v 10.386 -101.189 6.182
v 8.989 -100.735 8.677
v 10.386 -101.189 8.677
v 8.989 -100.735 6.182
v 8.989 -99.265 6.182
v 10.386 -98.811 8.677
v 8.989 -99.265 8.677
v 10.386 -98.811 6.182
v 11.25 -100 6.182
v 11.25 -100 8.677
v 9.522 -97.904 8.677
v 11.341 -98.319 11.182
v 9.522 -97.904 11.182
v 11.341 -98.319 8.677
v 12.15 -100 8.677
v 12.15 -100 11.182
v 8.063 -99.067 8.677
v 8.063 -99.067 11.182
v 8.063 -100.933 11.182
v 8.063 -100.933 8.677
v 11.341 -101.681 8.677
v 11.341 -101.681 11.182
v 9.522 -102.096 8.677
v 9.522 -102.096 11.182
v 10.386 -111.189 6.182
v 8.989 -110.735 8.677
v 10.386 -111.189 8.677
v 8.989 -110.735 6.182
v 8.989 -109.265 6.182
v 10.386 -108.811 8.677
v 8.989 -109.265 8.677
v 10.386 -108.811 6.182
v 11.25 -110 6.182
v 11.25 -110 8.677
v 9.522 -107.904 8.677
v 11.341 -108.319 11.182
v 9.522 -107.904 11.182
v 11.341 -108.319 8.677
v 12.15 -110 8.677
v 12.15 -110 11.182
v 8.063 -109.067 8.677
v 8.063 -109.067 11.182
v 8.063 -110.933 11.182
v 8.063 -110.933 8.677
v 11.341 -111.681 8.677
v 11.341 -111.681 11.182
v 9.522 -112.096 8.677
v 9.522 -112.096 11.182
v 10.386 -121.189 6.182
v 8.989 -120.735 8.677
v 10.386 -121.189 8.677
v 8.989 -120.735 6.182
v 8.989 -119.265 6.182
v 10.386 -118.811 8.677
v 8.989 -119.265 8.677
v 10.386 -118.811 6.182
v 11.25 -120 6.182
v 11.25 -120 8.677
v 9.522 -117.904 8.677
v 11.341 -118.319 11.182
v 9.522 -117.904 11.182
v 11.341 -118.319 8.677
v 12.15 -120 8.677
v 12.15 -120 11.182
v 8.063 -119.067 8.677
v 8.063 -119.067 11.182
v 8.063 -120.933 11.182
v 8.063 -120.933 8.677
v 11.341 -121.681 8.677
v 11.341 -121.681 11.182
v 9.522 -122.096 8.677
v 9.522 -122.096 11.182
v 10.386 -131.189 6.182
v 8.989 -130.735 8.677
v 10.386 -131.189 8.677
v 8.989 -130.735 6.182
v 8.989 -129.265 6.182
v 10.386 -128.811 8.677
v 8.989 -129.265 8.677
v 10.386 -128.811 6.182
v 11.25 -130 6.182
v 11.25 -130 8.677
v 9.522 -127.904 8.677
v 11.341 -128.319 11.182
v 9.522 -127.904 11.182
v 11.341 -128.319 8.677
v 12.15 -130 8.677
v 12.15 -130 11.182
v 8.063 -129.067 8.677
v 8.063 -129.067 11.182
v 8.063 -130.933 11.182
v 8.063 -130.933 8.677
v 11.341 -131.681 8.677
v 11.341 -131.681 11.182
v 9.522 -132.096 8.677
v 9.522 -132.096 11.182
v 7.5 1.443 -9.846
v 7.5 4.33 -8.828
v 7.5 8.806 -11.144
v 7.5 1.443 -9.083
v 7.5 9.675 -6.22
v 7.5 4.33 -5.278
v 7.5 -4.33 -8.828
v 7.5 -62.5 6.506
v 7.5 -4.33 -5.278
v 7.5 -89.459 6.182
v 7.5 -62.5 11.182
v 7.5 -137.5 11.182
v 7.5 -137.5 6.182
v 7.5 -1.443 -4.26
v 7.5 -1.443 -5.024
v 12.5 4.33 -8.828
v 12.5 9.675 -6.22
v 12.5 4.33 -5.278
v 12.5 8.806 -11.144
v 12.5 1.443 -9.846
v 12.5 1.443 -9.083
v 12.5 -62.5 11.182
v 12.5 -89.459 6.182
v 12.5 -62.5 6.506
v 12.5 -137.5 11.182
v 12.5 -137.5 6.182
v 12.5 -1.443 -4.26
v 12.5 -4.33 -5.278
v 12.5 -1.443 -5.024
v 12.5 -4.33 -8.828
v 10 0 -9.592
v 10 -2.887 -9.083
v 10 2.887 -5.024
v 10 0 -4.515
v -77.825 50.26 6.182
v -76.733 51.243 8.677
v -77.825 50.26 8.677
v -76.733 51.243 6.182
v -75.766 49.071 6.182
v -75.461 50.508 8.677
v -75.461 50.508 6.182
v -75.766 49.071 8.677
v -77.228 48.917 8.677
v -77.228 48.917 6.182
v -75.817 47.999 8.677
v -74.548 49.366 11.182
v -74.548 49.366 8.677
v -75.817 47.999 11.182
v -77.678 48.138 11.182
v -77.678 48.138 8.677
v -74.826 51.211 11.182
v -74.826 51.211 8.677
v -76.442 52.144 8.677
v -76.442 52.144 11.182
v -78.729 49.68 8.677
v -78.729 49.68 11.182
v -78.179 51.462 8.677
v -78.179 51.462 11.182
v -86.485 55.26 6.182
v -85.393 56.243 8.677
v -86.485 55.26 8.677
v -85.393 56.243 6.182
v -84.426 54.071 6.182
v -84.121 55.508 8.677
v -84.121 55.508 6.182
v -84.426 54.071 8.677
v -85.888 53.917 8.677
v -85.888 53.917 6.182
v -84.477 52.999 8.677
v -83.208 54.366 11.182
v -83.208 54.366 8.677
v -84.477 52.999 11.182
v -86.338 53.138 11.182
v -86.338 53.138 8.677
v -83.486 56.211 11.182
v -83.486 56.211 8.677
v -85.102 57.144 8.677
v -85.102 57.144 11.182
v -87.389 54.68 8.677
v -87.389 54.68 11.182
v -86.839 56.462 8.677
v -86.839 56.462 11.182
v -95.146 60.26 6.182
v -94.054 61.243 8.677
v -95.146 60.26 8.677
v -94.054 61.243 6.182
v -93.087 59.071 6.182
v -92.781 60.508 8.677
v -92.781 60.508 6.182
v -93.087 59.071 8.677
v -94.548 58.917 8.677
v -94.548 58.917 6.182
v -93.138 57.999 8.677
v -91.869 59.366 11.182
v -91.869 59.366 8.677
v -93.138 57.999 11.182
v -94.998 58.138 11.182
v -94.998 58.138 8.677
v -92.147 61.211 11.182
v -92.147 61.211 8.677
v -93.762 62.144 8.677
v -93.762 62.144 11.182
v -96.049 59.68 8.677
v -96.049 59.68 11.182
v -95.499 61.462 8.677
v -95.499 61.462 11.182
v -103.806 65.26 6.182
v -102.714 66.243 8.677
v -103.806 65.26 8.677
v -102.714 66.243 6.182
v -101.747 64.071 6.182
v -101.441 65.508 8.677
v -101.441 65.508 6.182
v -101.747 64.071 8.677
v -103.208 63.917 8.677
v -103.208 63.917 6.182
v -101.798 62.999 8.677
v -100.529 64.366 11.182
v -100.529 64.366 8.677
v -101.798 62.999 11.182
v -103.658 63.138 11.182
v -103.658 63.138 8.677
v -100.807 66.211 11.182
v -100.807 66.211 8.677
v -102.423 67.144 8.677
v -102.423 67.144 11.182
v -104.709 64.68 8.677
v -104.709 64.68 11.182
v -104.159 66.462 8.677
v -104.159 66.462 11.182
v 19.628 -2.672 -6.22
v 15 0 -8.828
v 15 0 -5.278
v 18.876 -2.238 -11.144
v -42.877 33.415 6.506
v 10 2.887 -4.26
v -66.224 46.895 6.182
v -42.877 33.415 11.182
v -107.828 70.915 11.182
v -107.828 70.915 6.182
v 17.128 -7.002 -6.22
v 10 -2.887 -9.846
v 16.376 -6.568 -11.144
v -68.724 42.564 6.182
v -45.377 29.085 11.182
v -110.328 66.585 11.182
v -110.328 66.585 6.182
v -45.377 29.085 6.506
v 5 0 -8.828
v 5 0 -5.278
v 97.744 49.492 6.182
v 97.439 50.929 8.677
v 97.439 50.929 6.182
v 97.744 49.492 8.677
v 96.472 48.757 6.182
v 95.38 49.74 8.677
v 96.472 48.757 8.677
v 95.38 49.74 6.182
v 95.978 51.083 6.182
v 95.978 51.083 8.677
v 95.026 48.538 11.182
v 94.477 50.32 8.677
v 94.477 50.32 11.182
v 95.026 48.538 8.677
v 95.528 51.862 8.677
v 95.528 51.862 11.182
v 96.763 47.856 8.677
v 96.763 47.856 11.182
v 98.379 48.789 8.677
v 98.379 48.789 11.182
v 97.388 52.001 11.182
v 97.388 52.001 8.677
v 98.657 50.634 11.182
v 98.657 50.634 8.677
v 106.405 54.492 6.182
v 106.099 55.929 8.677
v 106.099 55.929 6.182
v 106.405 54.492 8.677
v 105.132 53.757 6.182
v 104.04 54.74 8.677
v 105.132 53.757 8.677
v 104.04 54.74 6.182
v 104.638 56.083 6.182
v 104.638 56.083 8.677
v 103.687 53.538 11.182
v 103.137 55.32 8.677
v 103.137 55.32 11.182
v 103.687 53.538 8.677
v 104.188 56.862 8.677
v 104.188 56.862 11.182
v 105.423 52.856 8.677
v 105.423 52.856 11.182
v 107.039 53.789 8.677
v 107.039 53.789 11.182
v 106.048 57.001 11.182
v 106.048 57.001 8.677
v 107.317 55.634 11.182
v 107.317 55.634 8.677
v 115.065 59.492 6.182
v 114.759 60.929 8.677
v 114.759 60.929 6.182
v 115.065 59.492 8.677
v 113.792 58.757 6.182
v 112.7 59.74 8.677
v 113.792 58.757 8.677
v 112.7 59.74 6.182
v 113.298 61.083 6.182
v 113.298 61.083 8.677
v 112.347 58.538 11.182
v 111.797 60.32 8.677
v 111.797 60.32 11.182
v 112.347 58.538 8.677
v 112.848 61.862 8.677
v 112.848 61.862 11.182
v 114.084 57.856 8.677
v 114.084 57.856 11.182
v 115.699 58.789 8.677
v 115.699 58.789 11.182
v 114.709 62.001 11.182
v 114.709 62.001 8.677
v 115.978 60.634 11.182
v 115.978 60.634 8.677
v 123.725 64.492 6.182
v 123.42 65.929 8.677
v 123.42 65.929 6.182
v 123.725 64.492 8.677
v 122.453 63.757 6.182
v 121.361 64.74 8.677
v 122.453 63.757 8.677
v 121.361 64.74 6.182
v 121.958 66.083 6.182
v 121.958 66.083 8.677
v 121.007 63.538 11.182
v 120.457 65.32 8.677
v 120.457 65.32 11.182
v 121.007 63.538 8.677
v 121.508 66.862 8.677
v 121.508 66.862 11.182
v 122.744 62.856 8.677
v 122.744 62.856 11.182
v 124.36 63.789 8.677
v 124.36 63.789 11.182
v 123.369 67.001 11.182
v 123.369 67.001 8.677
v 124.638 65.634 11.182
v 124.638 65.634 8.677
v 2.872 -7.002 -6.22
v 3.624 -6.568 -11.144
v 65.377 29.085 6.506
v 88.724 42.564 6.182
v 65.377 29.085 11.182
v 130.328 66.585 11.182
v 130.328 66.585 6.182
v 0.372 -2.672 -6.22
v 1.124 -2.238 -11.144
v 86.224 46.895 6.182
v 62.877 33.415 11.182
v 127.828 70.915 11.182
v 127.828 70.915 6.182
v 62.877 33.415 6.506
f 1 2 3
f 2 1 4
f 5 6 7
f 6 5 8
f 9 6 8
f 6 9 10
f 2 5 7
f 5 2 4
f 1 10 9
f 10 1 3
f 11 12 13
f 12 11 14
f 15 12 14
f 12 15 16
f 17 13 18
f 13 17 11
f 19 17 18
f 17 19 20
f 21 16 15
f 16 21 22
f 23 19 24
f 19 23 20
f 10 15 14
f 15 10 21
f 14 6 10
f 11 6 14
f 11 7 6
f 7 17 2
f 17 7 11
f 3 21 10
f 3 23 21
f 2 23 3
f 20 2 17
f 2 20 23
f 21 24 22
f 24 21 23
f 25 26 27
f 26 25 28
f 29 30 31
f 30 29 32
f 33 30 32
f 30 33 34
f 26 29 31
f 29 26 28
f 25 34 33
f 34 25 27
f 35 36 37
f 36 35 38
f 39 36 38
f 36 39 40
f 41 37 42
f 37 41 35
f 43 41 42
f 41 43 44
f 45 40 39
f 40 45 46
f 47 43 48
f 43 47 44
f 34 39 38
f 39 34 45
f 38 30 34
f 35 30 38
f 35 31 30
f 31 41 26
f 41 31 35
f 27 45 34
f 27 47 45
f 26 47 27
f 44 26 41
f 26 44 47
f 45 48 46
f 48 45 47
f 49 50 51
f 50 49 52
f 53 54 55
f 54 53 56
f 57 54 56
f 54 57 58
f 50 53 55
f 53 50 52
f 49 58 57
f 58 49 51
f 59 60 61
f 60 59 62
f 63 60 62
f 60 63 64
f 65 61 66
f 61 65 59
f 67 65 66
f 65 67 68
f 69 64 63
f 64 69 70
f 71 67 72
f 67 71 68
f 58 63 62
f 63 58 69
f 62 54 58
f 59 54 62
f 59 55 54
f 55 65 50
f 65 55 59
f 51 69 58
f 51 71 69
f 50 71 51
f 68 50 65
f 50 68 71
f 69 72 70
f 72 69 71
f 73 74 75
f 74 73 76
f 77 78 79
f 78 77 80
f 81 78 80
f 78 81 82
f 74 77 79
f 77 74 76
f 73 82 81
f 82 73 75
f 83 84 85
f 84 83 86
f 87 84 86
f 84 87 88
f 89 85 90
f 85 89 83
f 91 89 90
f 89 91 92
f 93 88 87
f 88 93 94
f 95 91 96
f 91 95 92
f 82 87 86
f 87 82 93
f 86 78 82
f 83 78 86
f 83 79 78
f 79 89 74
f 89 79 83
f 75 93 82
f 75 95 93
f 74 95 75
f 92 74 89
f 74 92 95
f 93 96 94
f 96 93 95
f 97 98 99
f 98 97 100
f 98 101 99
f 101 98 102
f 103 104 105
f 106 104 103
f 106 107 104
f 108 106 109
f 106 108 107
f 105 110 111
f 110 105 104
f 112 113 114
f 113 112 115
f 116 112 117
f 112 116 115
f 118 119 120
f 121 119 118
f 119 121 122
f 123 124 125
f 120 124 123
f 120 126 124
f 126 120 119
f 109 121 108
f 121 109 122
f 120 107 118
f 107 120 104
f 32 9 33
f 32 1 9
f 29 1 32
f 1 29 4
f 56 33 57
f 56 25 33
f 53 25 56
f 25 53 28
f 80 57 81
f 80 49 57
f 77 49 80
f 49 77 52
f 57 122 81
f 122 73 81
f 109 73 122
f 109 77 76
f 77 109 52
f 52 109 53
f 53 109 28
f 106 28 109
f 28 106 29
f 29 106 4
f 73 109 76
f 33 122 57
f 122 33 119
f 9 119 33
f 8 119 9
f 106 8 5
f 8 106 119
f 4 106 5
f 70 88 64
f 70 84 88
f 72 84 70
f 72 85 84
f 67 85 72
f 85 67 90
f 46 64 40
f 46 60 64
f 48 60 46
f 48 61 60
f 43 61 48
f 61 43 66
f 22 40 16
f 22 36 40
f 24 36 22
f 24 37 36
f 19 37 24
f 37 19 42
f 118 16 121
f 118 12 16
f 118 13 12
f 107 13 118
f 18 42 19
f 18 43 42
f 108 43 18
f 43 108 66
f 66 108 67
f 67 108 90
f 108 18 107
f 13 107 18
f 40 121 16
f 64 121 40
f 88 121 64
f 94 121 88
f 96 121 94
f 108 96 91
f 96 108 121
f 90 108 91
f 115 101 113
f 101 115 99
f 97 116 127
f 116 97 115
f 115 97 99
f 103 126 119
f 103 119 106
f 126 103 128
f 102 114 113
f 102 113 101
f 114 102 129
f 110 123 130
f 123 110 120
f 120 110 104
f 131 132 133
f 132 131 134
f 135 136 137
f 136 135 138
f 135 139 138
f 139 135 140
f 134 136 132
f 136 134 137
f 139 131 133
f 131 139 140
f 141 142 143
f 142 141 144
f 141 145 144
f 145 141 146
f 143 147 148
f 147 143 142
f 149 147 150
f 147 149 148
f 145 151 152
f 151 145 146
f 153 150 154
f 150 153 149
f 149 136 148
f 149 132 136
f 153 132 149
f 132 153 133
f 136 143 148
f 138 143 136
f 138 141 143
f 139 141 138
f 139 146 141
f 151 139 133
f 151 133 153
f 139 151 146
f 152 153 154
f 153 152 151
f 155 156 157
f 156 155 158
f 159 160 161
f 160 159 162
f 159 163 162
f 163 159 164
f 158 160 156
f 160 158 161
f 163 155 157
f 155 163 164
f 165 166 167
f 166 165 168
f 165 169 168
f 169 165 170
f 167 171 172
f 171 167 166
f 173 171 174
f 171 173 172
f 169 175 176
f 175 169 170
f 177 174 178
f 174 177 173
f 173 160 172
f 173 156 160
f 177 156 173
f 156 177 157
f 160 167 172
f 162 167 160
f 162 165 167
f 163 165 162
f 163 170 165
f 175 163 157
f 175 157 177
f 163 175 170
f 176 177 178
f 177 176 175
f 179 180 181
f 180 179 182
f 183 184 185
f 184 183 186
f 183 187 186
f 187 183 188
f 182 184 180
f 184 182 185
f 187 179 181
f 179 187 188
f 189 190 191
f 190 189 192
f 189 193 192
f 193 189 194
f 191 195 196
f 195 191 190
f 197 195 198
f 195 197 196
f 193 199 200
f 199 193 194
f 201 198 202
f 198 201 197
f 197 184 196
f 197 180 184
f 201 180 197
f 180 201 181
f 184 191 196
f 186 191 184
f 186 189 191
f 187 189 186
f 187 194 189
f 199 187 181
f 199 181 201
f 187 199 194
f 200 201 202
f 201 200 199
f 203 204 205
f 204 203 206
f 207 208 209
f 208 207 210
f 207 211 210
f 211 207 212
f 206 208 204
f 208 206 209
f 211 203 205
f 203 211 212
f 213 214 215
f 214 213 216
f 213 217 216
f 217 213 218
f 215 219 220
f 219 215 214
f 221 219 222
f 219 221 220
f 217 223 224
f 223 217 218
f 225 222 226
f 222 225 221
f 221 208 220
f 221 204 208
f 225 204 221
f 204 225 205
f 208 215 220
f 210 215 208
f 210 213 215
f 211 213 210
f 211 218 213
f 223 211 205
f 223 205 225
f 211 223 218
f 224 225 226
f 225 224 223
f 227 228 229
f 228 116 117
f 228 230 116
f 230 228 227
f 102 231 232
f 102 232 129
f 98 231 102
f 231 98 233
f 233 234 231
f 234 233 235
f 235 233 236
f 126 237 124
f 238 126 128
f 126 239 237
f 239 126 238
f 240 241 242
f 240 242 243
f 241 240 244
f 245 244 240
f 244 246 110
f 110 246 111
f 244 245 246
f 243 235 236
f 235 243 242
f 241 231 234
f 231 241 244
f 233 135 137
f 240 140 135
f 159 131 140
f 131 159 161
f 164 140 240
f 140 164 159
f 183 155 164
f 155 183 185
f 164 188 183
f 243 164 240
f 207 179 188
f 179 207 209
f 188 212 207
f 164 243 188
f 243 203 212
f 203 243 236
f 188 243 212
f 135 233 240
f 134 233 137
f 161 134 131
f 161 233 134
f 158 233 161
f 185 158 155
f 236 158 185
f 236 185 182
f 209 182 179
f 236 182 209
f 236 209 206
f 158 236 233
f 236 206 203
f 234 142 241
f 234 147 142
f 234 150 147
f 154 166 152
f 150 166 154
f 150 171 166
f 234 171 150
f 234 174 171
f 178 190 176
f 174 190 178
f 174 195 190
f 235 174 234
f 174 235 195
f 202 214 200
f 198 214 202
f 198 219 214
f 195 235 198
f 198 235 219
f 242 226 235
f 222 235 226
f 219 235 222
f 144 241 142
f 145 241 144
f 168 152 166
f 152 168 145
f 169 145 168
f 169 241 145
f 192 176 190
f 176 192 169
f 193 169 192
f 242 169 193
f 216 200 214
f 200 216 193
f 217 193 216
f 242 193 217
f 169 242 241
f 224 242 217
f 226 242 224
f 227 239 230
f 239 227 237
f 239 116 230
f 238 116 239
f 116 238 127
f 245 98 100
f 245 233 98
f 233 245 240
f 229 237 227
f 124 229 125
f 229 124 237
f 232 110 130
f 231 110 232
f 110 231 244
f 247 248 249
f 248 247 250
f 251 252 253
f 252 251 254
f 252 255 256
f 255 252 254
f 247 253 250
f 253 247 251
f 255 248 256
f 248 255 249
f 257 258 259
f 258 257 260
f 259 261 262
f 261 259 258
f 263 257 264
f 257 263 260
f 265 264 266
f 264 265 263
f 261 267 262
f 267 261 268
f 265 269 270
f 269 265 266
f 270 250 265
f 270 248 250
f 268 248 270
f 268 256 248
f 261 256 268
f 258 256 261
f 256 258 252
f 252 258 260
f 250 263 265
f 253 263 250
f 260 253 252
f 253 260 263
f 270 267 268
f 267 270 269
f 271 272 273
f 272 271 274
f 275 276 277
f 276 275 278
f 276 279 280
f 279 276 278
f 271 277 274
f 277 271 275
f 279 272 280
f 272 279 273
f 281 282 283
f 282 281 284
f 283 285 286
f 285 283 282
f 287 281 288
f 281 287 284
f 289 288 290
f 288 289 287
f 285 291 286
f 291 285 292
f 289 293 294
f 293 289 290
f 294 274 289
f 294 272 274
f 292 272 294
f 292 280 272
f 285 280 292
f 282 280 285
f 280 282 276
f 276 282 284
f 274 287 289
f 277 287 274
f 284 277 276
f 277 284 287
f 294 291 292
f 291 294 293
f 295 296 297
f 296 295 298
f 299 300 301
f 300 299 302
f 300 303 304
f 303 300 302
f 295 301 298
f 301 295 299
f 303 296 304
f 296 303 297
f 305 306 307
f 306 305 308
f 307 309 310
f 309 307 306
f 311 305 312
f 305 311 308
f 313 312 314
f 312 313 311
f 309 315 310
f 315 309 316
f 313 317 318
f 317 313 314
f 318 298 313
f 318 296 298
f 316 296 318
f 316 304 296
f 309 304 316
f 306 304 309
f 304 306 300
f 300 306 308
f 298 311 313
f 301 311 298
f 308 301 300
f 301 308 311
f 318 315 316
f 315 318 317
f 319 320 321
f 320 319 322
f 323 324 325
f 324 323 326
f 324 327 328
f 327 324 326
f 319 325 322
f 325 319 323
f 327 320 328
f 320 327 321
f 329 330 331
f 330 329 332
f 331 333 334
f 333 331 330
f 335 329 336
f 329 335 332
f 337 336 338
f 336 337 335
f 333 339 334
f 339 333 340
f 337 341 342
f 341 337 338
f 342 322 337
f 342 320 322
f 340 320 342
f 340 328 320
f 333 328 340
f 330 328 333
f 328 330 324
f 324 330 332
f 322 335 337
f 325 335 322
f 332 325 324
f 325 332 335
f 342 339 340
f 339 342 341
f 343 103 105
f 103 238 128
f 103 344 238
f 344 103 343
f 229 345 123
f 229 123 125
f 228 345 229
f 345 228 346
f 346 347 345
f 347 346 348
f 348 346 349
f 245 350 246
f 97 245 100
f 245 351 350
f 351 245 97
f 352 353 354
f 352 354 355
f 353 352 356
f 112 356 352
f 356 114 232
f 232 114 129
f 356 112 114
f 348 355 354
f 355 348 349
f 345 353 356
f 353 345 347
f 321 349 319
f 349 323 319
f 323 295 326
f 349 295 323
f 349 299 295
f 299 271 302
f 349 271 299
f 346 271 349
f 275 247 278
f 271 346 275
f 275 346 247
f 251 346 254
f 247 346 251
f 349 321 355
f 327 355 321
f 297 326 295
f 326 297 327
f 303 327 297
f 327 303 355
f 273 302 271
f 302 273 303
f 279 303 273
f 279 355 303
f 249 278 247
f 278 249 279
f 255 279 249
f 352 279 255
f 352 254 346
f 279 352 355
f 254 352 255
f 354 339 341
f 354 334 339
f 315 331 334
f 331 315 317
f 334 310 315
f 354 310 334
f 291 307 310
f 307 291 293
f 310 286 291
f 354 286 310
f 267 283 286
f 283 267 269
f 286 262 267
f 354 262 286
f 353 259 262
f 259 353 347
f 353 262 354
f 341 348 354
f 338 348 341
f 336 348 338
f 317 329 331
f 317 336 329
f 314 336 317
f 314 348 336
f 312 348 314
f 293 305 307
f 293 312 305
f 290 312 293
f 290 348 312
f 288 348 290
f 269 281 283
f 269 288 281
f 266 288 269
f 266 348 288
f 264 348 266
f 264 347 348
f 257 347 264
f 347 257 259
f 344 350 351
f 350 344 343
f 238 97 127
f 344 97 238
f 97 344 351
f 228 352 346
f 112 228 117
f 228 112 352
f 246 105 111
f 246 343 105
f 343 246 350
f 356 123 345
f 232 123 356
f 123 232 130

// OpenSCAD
// file: nutsnbolts/data-access.scad
// Norm Nuts and Bolts - a OpenSCAD library
// Copyright (C) 2012  Johannes Kneer

// This program is free software: you can redistribute it and/or modify
// it under the terms of the GNU General Public License as published by
// the Free Software Foundation, either version 3 of the License, or
// (at your option) any later version.

// This program is distributed in the hope that it will be useful,
// but WITHOUT ANY WARRANTY; without even the implied warranty of
// MERCHANTABILITY or FITNESS FOR A PARTICULAR PURPOSE.  See the
// GNU General Public License for more details.

// You should have received a copy of the GNU General Public License
// along with this program.  If not, see <http://www.gnu.org/licenses/>.


// DATABASE ACCESS FUNCTIONS AND CONSTANTS



// == CONSTANTS ==

// screw table access keys
_NB_S_DESC            = 0;
_NB_S_FAMKEY			    = 1;
_NB_S_LENGTH          = 2;
_NB_S_NOTHREAD_LENGTH = 3;

_NB_F_DESC			      = 0;
_NB_F_OUTER_DIA       = 1;
_NB_F_INNER_DIA       = 2;
_NB_F_LEAD            = 3;
_NB_F_KEY             = 4;
_NB_F_KEY_DEPTH       = 5;
_NB_F_HEAD_HEIGHT     = 6;
_NB_F_HEAD_DIA        = 7;
_NB_F_NUT_KEY         = 8;
_NB_F_NUT_HEIGHT      = 9;
_NB_F_PITCH_FINE      = 10;
_NB_F_PITCH_MEDIUM    = 11;
_NB_F_PITCH_COARSE    = 12;


// == FUNCTIONS ==

// _get_screw("descriptor")   with descriptor = M8x25
//   find the line for a general object in the data matrix

function _get_screw(n) = data_screw[search([n], data_screw)[0]];
function _get_screw_fam(n) = data_screw_fam[search([_get_screw(n)[_NB_S_FAMKEY]], data_screw_fam)[0]];

function _get_fam(n) = data_screw_fam[search([n], data_screw_fam)[0]];


// _get_XXXXX("descriptor") functions
// find a single property in the database

function _get_desc(n)        = _get_screw(n)[_NB_S_DESC];
function _get_famkey(n)         = _get_screw(n)[_NB_S_FAMKEY];
function _get_length(n)      = _get_screw(n)[_NB_S_LENGTH];
function _get_nt_length(n)   = _get_screw(n)[_NB_S_NOTHREAD_LENGTH];

function _get_outer_dia(n)   = _get_screw_fam(n)[_NB_F_OUTER_DIA];
function _get_inner_dia(n)   = _get_screw_fam(n)[_NB_F_INNER_DIA];
function _get_lead(n)        = _get_screw_fam(n)[_NB_F_LEAD];
function _get_head_height(n) = _get_screw_fam(n)[_NB_F_HEAD_HEIGHT];
function _get_head_dia(n)    = _get_screw_fam(n)[_NB_F_HEAD_DIA];
function _get_nut_key(n)     = _get_screw_fam(n)[_NB_F_NUT_KEY];
function _get_nut_height(n)  = _get_screw_fam(n)[_NB_F_NUT_HEIGHT];
function _get_fine_pitch(n)  = _get_screw_fam(n)[_NB_F_PITCH_FINE];
function _get_medium_pitch(n)  = _get_screw_fam(n)[_NB_F_PITCH_MEDIUM];
function _get_coarse_pitch(n)  = _get_screw_fam(n)[_NB_F_PITCH_COARSE];
// file: nutsnbolts/materials.scad
// Norm Nuts and Bolts - a OpenSCAD library
// Copyright (C) 2012  Johannes Kneer

// This program is free software: you can redistribute it and/or modify
// it under the terms of the GNU General Public License as published by
// the Free Software Foundation, either version 3 of the License, or
// (at your option) any later version.

// This program is distributed in the hope that it will be useful,
// but WITHOUT ANY WARRANTY; without even the implied warranty of
// MERCHANTABILITY or FITNESS FOR A PARTICULAR PURPOSE.  See the
// GNU General Public License for more details.

// You should have received a copy of the GNU General Public License
// along with this program.  If not, see <http://www.gnu.org/licenses/>.


// MATERIALS

// all materials take a no-parameter that should be used to document
// the exact material in code, the number is not yet used in the code 



module stainless(no="1.4301") {
	color([0.45, 0.43, 0.5]) children([0:$children-1]);
}

module steel(no) {
	color([0.65, 0.67, 0.72]) children([0:$children-1]);
}

module iron(no="ST37") {
	color([0.36, 0.33, 0.33]) children([0:$children-1]);
}

// additional colors
CL_ZINC = [0.4, 0.4, 0.4];
// file: utilits.scad
include <nutsnbolts/materials.scad>;
include <nutsnbolts/cyl_head_bolt.scad>;

module blabla(){
    cube([10,10,10], center = true);

}


module rotation_sym(r, N, z, rot) {
     for (i = [0:N-1]) {
        rotate(  - rot* i*2*180/(N), [0,0,1] ) {
            translate([r*cos(i*2*180/(N)),r*sin(i*2*180/N),z]) {
                children();
            }
        }
    }
}
// main file
cm              = 10               ;
sidelength      = 0.5   * cm       ;
width           = 0.5   * cm       ;
length          = 10    * cm       ;
delta           = 4     * cm       ;
discenter       = 1.1   * cm       ;
teta            = 80               ;


include <./utilits.scad>;

include <nutsnbolts/materials.scad>;
include <nutsnbolts/cyl_head_bolt.scad>;

module arm() {

    rotate(80, [1,0,0]) {
        cube( [width, sidelength, length ]  ,center=true);
    }

    translate([0, -length/2 -cm, cos(teta)*0.5*length  ]) {
        difference() {
            rotate(90, [1,0,0]) {
                cube( [width, sidelength, 3*length/4 ]  ,center=true);
            }
            for( i=[0:3]){
                translate([0,-i*cm,1*cm]) {
                    hole_through(name="M2", l= 2*cm, cld= 0.5, h= 10 , hcld=0.5);
                }
            }
        }
    }
}

module Timber(){
    rotation_sym(1*cm, 3, 0, 1)  translate( [0, -length/2 + cm, 0 ] ) arm();
}

Timber();
